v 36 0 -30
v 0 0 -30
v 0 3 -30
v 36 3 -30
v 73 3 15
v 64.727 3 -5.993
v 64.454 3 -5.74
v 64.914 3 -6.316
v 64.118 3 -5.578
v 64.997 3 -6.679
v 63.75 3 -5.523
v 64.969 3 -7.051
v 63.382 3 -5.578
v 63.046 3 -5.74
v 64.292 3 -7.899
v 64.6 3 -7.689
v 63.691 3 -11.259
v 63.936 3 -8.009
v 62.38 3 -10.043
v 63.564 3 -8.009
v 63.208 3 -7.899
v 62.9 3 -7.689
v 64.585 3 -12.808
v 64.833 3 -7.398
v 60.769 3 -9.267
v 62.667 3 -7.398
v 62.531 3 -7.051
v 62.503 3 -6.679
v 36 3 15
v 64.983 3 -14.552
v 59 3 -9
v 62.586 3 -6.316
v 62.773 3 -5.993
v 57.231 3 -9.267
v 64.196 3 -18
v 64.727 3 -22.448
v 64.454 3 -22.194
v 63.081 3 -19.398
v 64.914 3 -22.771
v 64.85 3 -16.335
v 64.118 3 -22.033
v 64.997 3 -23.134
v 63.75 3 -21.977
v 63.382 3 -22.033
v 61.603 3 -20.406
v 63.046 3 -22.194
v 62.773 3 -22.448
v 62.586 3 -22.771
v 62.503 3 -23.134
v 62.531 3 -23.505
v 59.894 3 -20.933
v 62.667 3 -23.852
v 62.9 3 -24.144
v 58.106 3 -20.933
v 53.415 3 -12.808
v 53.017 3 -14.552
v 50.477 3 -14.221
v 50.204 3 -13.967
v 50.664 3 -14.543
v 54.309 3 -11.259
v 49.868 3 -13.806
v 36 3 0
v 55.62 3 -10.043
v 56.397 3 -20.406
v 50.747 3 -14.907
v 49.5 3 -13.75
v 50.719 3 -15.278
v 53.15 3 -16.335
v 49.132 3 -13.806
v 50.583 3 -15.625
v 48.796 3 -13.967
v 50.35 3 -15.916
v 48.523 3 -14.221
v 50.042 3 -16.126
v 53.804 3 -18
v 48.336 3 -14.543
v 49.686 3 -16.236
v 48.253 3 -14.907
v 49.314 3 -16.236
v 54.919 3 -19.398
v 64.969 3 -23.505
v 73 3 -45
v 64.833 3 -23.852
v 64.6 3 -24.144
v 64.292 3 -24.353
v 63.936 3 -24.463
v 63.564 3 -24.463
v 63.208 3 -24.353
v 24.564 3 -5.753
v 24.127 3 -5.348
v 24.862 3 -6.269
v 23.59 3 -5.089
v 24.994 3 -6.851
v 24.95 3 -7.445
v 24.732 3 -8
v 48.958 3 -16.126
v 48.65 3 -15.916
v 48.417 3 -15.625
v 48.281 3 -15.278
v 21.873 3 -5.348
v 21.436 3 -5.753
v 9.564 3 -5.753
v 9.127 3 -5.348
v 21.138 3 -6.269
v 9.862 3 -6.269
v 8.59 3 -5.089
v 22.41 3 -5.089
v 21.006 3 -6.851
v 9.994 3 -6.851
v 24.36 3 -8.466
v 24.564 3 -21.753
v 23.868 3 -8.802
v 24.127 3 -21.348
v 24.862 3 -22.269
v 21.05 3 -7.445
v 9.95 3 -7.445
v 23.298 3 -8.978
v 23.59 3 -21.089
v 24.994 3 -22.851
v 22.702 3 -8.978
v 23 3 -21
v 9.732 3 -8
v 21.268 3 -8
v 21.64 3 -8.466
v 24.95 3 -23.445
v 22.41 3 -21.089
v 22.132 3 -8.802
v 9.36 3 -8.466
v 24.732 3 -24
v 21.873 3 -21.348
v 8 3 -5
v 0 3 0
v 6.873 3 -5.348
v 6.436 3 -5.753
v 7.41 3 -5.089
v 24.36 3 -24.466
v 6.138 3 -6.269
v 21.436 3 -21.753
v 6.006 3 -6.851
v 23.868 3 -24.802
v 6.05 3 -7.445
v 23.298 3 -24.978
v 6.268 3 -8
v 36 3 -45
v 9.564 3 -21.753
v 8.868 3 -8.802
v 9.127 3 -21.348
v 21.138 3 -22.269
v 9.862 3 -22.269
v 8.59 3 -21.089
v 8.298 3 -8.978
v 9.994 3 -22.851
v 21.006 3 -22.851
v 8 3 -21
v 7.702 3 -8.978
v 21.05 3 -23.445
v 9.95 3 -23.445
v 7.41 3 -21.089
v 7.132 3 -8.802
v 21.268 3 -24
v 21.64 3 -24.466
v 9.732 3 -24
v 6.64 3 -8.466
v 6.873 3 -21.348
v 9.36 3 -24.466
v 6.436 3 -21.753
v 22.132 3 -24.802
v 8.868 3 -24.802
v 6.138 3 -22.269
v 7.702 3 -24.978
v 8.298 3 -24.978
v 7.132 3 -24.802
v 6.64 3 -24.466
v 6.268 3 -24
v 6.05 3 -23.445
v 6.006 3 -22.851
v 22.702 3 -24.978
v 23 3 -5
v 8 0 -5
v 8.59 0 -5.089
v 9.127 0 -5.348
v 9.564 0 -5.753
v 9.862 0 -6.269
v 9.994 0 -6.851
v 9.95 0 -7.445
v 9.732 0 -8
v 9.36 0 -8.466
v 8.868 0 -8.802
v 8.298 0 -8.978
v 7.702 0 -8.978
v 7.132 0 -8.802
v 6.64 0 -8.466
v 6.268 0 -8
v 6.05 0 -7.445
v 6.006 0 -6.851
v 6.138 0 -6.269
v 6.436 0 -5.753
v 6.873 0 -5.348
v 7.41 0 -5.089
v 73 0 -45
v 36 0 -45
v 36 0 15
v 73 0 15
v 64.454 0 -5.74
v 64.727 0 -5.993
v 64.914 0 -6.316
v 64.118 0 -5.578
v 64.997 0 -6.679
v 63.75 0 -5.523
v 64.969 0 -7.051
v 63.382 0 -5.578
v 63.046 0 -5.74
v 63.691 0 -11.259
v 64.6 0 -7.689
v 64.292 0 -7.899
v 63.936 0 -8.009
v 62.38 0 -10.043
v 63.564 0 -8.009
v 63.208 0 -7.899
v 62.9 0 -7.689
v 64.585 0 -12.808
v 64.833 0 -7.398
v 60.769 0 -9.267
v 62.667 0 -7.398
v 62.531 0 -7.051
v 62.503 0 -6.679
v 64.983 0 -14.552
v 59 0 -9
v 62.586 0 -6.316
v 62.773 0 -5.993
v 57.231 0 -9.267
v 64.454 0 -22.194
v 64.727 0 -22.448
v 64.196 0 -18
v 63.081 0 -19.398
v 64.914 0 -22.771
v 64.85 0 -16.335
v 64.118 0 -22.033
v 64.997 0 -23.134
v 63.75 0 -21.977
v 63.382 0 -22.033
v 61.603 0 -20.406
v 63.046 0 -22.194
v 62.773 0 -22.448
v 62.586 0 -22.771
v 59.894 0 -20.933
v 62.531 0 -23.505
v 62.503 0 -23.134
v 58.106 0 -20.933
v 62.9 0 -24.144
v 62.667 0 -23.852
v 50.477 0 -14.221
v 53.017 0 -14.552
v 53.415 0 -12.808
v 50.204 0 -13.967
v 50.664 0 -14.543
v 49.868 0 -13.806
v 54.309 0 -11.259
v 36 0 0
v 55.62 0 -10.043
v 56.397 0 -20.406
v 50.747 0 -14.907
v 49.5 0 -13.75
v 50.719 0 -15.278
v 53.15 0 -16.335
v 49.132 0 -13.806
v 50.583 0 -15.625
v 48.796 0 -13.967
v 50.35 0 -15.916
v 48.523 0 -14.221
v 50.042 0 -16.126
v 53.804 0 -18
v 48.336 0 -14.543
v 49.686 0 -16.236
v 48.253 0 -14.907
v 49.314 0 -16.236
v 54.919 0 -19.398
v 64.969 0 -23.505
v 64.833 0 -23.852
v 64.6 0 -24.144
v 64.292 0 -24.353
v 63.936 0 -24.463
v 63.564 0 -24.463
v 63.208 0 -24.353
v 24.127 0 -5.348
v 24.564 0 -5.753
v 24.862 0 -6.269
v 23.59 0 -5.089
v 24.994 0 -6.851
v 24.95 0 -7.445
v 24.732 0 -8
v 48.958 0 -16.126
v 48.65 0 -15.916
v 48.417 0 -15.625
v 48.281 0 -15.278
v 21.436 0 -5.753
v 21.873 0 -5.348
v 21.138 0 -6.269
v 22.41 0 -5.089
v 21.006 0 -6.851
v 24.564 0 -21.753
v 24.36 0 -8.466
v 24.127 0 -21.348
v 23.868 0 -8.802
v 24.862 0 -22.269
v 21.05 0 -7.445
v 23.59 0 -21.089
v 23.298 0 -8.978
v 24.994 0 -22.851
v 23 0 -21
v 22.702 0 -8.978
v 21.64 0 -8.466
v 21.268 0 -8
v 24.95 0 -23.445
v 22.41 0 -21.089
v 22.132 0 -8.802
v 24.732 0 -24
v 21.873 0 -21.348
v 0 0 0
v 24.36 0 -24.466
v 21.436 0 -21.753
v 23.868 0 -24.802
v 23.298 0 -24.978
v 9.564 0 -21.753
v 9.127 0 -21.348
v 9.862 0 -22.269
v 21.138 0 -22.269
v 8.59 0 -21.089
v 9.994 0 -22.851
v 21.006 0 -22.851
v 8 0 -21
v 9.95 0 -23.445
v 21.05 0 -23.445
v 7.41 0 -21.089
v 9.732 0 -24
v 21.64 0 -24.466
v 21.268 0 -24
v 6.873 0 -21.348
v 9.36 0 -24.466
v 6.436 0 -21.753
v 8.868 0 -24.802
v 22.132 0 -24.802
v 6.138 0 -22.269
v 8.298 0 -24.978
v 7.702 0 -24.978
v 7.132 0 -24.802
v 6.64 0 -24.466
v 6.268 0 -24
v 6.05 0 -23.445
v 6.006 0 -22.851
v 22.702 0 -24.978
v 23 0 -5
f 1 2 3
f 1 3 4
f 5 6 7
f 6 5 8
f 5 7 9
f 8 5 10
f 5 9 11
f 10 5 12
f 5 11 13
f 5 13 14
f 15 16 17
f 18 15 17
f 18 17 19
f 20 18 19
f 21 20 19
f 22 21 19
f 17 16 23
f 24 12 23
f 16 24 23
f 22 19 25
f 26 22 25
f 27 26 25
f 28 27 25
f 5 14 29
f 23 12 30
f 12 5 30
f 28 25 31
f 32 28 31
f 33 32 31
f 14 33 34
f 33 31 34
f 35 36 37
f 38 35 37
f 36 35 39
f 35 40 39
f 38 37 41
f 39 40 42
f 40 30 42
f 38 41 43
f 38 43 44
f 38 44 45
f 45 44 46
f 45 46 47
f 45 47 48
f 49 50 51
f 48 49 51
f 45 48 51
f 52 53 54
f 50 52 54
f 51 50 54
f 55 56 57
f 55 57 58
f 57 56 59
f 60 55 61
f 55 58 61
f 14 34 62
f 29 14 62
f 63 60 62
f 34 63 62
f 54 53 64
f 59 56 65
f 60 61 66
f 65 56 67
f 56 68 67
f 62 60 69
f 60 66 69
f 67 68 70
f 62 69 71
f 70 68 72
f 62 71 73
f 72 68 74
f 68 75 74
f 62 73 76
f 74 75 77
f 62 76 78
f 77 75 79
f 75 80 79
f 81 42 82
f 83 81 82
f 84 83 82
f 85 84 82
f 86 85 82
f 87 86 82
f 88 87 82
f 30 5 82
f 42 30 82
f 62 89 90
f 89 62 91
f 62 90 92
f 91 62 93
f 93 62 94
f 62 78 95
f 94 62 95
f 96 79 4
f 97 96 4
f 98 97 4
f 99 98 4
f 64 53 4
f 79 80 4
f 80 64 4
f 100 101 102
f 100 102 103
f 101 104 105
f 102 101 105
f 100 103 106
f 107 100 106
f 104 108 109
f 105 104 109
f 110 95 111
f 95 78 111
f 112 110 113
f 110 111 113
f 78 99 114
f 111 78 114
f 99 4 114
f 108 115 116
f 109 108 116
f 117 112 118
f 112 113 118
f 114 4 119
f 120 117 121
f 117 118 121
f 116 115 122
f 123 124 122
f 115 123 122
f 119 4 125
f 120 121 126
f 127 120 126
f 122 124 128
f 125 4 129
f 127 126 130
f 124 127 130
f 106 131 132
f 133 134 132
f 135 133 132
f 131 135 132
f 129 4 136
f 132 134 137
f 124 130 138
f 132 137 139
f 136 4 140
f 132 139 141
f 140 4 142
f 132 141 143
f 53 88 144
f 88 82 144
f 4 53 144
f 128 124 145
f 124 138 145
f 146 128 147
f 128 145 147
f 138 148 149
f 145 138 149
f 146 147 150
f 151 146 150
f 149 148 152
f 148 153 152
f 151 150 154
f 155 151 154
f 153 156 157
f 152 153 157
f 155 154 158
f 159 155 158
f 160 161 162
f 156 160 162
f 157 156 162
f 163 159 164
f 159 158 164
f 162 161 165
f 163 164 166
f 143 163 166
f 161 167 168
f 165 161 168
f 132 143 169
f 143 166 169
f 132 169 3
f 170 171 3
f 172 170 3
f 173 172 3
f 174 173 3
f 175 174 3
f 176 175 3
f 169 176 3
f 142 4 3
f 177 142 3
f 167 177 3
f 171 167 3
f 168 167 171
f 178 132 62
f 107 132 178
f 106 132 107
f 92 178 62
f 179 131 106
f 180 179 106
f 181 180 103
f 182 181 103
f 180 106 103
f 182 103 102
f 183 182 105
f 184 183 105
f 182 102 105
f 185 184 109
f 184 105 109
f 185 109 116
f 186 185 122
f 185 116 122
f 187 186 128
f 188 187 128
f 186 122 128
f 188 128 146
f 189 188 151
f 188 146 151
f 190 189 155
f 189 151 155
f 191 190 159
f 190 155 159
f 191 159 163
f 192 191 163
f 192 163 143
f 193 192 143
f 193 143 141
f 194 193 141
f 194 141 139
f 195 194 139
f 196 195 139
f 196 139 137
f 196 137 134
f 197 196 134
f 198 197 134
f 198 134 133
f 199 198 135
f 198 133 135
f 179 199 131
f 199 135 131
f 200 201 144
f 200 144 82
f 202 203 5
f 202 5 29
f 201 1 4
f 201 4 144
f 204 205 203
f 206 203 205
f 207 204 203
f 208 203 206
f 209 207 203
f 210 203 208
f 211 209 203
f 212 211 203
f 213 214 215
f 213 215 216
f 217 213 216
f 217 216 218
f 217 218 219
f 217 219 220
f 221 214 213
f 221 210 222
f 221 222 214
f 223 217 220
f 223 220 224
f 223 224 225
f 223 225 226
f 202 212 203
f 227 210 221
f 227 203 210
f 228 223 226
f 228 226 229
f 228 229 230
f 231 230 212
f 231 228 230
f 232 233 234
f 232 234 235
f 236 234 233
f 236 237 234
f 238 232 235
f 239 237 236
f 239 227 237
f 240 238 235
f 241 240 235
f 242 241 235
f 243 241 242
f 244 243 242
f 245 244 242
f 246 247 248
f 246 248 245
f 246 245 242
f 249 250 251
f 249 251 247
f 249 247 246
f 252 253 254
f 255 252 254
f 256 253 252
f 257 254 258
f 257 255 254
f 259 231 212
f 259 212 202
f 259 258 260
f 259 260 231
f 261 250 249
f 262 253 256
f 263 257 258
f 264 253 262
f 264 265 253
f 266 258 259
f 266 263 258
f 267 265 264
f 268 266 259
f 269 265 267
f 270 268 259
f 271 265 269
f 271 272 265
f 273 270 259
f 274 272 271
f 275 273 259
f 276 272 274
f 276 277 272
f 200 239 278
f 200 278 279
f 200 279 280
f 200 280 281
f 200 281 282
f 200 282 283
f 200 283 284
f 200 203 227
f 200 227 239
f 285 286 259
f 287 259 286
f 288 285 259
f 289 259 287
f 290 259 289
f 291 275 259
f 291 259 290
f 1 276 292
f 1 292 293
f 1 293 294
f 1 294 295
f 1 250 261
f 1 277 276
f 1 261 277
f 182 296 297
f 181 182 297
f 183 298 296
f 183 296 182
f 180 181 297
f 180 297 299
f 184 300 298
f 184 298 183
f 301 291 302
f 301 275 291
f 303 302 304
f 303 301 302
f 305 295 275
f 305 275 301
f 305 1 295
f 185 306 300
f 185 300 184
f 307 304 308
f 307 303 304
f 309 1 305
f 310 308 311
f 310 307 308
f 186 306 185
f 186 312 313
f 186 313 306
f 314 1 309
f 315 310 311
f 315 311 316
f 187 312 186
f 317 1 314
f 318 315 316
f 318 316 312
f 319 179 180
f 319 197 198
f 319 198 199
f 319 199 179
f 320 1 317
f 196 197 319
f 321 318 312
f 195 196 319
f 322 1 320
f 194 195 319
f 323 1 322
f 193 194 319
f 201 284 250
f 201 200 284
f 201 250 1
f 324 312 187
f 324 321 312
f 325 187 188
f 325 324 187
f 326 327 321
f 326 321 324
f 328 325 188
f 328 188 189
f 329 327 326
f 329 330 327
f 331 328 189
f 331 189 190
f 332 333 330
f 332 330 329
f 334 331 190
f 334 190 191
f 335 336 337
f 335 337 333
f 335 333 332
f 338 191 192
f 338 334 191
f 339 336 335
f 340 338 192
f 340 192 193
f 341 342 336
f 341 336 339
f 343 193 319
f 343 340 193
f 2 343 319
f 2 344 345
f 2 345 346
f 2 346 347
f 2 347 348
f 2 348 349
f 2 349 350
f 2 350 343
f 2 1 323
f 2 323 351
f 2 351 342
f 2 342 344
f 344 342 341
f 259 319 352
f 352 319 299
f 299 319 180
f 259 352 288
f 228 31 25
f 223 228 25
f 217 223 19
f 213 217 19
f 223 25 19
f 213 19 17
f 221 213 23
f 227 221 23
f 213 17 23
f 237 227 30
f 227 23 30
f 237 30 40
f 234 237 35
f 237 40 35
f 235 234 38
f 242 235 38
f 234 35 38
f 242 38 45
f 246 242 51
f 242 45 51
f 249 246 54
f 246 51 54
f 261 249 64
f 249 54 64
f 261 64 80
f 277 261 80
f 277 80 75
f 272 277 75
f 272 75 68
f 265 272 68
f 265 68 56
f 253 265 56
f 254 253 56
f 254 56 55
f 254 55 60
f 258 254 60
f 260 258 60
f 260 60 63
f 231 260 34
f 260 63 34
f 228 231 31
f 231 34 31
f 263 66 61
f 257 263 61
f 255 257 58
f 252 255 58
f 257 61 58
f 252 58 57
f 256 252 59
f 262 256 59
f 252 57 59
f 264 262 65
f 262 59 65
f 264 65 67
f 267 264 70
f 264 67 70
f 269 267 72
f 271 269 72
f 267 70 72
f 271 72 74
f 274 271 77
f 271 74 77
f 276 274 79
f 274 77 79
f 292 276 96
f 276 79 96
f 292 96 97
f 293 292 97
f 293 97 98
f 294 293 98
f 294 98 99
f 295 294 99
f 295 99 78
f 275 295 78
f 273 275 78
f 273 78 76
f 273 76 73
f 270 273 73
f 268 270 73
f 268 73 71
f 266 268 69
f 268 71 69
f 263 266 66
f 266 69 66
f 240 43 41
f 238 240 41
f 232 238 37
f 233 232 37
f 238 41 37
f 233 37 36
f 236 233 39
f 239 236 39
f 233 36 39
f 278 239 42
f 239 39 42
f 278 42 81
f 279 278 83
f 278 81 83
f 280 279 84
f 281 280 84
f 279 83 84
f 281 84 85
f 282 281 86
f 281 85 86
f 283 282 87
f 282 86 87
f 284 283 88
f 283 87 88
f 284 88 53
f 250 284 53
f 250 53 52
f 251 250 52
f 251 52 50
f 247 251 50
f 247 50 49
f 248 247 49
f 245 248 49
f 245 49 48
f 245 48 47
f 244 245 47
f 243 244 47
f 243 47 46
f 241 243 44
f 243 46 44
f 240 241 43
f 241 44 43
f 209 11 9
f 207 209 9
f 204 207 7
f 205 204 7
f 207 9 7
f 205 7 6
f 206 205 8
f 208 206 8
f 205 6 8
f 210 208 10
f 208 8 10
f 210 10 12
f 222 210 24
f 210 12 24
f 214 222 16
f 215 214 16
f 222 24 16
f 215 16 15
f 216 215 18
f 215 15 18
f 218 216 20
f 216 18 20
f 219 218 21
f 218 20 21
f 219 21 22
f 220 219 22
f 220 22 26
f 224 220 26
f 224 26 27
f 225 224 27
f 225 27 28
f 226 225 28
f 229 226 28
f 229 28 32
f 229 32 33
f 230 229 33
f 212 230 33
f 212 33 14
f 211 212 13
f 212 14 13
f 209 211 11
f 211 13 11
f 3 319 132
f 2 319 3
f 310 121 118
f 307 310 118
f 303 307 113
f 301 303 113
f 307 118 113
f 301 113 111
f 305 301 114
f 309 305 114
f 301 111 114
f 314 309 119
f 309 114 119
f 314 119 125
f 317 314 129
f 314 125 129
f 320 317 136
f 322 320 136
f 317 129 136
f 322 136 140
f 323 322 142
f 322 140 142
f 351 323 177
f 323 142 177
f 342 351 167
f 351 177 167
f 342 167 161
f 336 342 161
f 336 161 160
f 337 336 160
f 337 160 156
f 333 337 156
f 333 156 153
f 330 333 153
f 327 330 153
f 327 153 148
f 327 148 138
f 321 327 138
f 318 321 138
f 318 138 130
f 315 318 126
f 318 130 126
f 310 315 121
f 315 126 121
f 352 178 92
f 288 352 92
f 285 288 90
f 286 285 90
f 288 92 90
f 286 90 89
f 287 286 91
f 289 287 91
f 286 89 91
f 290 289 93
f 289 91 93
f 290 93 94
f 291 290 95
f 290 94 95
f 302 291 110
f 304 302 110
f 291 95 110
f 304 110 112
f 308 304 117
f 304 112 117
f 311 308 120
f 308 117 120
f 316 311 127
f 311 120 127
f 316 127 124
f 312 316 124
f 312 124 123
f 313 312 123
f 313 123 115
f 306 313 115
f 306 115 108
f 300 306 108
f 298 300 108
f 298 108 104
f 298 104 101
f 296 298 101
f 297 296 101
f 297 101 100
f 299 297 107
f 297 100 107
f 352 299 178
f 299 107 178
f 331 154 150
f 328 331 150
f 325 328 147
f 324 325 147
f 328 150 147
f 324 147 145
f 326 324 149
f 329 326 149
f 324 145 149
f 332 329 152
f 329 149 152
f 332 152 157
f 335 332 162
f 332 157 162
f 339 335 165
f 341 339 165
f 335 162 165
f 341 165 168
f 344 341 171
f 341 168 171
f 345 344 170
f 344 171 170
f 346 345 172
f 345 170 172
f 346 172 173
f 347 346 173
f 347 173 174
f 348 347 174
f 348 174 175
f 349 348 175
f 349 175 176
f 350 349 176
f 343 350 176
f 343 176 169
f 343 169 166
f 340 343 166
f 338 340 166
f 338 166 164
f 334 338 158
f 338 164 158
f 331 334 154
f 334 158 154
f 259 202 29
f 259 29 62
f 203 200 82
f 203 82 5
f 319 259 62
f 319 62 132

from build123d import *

# Parameters (mm, degrees)
EXTRUDE_1_DEPTH     = 3
SKETCH_2_R          = 2
SKETCH_2_R_2        = 6
CUT_EXTRUDE_1_DEPTH = 3
SKETCH_3_R          = 1.25
CUT_EXTRUDE_2_DEPTH = 3


with BuildPart() as part:
    # 草图1 → 凸台-拉伸1 (new body)
    with BuildSketch(Plane(origin=(0, 0, 0), x_dir=(1, 0, 0), z_dir=(0, 1, 0))):
        Polygon((0, 0), (0, 30), (36, 30), (36, 45), (73, 45), (73, -15), (36, -15), (36, 0), align=None)
    extrude(amount=EXTRUDE_1_DEPTH)

    # 草图2 → 切除-拉伸1 (cut)
    with BuildSketch(Plane(origin=(0, 3, 0), x_dir=(1, 0, 0), z_dir=(0, 1, 0))):
        with Locations(Location((8, 23, 0), (0, 0, 270))):
            Circle(SKETCH_2_R)
        with Locations(Location((23, 23, 0), (0, 0, 270))):
            Circle(SKETCH_2_R)
        with Locations(Location((8, 7, 0), (0, 0, 270))):
            Circle(SKETCH_2_R)
        with Locations(Location((23, 7, 0), (0, 0, 270))):
            Circle(SKETCH_2_R)
        with Locations(Location((59, 15, 0), (0, 0, 270))):
            Circle(SKETCH_2_R_2)
    extrude(amount=-CUT_EXTRUDE_1_DEPTH, mode=Mode.SUBTRACT)

    # 草图3 → 切除-拉伸2 (cut)
    with BuildSketch(Plane(origin=(0, 3, 0), x_dir=(1, 0, 0), z_dir=(0, 1, 0))):
        with Locations(Location((63.75, 23.227241336, 0), (0, 0, 270))):
            Circle(SKETCH_3_R)
        with Locations(Location((63.75, 6.772758664, 0), (0, 0, 270))):
            Circle(SKETCH_3_R)
        with Locations(Location((49.5, 15, 0), (0, 0, 270))):
            Circle(SKETCH_3_R)
    extrude(amount=-CUT_EXTRUDE_2_DEPTH, mode=Mode.SUBTRACT)


solid = part.part
